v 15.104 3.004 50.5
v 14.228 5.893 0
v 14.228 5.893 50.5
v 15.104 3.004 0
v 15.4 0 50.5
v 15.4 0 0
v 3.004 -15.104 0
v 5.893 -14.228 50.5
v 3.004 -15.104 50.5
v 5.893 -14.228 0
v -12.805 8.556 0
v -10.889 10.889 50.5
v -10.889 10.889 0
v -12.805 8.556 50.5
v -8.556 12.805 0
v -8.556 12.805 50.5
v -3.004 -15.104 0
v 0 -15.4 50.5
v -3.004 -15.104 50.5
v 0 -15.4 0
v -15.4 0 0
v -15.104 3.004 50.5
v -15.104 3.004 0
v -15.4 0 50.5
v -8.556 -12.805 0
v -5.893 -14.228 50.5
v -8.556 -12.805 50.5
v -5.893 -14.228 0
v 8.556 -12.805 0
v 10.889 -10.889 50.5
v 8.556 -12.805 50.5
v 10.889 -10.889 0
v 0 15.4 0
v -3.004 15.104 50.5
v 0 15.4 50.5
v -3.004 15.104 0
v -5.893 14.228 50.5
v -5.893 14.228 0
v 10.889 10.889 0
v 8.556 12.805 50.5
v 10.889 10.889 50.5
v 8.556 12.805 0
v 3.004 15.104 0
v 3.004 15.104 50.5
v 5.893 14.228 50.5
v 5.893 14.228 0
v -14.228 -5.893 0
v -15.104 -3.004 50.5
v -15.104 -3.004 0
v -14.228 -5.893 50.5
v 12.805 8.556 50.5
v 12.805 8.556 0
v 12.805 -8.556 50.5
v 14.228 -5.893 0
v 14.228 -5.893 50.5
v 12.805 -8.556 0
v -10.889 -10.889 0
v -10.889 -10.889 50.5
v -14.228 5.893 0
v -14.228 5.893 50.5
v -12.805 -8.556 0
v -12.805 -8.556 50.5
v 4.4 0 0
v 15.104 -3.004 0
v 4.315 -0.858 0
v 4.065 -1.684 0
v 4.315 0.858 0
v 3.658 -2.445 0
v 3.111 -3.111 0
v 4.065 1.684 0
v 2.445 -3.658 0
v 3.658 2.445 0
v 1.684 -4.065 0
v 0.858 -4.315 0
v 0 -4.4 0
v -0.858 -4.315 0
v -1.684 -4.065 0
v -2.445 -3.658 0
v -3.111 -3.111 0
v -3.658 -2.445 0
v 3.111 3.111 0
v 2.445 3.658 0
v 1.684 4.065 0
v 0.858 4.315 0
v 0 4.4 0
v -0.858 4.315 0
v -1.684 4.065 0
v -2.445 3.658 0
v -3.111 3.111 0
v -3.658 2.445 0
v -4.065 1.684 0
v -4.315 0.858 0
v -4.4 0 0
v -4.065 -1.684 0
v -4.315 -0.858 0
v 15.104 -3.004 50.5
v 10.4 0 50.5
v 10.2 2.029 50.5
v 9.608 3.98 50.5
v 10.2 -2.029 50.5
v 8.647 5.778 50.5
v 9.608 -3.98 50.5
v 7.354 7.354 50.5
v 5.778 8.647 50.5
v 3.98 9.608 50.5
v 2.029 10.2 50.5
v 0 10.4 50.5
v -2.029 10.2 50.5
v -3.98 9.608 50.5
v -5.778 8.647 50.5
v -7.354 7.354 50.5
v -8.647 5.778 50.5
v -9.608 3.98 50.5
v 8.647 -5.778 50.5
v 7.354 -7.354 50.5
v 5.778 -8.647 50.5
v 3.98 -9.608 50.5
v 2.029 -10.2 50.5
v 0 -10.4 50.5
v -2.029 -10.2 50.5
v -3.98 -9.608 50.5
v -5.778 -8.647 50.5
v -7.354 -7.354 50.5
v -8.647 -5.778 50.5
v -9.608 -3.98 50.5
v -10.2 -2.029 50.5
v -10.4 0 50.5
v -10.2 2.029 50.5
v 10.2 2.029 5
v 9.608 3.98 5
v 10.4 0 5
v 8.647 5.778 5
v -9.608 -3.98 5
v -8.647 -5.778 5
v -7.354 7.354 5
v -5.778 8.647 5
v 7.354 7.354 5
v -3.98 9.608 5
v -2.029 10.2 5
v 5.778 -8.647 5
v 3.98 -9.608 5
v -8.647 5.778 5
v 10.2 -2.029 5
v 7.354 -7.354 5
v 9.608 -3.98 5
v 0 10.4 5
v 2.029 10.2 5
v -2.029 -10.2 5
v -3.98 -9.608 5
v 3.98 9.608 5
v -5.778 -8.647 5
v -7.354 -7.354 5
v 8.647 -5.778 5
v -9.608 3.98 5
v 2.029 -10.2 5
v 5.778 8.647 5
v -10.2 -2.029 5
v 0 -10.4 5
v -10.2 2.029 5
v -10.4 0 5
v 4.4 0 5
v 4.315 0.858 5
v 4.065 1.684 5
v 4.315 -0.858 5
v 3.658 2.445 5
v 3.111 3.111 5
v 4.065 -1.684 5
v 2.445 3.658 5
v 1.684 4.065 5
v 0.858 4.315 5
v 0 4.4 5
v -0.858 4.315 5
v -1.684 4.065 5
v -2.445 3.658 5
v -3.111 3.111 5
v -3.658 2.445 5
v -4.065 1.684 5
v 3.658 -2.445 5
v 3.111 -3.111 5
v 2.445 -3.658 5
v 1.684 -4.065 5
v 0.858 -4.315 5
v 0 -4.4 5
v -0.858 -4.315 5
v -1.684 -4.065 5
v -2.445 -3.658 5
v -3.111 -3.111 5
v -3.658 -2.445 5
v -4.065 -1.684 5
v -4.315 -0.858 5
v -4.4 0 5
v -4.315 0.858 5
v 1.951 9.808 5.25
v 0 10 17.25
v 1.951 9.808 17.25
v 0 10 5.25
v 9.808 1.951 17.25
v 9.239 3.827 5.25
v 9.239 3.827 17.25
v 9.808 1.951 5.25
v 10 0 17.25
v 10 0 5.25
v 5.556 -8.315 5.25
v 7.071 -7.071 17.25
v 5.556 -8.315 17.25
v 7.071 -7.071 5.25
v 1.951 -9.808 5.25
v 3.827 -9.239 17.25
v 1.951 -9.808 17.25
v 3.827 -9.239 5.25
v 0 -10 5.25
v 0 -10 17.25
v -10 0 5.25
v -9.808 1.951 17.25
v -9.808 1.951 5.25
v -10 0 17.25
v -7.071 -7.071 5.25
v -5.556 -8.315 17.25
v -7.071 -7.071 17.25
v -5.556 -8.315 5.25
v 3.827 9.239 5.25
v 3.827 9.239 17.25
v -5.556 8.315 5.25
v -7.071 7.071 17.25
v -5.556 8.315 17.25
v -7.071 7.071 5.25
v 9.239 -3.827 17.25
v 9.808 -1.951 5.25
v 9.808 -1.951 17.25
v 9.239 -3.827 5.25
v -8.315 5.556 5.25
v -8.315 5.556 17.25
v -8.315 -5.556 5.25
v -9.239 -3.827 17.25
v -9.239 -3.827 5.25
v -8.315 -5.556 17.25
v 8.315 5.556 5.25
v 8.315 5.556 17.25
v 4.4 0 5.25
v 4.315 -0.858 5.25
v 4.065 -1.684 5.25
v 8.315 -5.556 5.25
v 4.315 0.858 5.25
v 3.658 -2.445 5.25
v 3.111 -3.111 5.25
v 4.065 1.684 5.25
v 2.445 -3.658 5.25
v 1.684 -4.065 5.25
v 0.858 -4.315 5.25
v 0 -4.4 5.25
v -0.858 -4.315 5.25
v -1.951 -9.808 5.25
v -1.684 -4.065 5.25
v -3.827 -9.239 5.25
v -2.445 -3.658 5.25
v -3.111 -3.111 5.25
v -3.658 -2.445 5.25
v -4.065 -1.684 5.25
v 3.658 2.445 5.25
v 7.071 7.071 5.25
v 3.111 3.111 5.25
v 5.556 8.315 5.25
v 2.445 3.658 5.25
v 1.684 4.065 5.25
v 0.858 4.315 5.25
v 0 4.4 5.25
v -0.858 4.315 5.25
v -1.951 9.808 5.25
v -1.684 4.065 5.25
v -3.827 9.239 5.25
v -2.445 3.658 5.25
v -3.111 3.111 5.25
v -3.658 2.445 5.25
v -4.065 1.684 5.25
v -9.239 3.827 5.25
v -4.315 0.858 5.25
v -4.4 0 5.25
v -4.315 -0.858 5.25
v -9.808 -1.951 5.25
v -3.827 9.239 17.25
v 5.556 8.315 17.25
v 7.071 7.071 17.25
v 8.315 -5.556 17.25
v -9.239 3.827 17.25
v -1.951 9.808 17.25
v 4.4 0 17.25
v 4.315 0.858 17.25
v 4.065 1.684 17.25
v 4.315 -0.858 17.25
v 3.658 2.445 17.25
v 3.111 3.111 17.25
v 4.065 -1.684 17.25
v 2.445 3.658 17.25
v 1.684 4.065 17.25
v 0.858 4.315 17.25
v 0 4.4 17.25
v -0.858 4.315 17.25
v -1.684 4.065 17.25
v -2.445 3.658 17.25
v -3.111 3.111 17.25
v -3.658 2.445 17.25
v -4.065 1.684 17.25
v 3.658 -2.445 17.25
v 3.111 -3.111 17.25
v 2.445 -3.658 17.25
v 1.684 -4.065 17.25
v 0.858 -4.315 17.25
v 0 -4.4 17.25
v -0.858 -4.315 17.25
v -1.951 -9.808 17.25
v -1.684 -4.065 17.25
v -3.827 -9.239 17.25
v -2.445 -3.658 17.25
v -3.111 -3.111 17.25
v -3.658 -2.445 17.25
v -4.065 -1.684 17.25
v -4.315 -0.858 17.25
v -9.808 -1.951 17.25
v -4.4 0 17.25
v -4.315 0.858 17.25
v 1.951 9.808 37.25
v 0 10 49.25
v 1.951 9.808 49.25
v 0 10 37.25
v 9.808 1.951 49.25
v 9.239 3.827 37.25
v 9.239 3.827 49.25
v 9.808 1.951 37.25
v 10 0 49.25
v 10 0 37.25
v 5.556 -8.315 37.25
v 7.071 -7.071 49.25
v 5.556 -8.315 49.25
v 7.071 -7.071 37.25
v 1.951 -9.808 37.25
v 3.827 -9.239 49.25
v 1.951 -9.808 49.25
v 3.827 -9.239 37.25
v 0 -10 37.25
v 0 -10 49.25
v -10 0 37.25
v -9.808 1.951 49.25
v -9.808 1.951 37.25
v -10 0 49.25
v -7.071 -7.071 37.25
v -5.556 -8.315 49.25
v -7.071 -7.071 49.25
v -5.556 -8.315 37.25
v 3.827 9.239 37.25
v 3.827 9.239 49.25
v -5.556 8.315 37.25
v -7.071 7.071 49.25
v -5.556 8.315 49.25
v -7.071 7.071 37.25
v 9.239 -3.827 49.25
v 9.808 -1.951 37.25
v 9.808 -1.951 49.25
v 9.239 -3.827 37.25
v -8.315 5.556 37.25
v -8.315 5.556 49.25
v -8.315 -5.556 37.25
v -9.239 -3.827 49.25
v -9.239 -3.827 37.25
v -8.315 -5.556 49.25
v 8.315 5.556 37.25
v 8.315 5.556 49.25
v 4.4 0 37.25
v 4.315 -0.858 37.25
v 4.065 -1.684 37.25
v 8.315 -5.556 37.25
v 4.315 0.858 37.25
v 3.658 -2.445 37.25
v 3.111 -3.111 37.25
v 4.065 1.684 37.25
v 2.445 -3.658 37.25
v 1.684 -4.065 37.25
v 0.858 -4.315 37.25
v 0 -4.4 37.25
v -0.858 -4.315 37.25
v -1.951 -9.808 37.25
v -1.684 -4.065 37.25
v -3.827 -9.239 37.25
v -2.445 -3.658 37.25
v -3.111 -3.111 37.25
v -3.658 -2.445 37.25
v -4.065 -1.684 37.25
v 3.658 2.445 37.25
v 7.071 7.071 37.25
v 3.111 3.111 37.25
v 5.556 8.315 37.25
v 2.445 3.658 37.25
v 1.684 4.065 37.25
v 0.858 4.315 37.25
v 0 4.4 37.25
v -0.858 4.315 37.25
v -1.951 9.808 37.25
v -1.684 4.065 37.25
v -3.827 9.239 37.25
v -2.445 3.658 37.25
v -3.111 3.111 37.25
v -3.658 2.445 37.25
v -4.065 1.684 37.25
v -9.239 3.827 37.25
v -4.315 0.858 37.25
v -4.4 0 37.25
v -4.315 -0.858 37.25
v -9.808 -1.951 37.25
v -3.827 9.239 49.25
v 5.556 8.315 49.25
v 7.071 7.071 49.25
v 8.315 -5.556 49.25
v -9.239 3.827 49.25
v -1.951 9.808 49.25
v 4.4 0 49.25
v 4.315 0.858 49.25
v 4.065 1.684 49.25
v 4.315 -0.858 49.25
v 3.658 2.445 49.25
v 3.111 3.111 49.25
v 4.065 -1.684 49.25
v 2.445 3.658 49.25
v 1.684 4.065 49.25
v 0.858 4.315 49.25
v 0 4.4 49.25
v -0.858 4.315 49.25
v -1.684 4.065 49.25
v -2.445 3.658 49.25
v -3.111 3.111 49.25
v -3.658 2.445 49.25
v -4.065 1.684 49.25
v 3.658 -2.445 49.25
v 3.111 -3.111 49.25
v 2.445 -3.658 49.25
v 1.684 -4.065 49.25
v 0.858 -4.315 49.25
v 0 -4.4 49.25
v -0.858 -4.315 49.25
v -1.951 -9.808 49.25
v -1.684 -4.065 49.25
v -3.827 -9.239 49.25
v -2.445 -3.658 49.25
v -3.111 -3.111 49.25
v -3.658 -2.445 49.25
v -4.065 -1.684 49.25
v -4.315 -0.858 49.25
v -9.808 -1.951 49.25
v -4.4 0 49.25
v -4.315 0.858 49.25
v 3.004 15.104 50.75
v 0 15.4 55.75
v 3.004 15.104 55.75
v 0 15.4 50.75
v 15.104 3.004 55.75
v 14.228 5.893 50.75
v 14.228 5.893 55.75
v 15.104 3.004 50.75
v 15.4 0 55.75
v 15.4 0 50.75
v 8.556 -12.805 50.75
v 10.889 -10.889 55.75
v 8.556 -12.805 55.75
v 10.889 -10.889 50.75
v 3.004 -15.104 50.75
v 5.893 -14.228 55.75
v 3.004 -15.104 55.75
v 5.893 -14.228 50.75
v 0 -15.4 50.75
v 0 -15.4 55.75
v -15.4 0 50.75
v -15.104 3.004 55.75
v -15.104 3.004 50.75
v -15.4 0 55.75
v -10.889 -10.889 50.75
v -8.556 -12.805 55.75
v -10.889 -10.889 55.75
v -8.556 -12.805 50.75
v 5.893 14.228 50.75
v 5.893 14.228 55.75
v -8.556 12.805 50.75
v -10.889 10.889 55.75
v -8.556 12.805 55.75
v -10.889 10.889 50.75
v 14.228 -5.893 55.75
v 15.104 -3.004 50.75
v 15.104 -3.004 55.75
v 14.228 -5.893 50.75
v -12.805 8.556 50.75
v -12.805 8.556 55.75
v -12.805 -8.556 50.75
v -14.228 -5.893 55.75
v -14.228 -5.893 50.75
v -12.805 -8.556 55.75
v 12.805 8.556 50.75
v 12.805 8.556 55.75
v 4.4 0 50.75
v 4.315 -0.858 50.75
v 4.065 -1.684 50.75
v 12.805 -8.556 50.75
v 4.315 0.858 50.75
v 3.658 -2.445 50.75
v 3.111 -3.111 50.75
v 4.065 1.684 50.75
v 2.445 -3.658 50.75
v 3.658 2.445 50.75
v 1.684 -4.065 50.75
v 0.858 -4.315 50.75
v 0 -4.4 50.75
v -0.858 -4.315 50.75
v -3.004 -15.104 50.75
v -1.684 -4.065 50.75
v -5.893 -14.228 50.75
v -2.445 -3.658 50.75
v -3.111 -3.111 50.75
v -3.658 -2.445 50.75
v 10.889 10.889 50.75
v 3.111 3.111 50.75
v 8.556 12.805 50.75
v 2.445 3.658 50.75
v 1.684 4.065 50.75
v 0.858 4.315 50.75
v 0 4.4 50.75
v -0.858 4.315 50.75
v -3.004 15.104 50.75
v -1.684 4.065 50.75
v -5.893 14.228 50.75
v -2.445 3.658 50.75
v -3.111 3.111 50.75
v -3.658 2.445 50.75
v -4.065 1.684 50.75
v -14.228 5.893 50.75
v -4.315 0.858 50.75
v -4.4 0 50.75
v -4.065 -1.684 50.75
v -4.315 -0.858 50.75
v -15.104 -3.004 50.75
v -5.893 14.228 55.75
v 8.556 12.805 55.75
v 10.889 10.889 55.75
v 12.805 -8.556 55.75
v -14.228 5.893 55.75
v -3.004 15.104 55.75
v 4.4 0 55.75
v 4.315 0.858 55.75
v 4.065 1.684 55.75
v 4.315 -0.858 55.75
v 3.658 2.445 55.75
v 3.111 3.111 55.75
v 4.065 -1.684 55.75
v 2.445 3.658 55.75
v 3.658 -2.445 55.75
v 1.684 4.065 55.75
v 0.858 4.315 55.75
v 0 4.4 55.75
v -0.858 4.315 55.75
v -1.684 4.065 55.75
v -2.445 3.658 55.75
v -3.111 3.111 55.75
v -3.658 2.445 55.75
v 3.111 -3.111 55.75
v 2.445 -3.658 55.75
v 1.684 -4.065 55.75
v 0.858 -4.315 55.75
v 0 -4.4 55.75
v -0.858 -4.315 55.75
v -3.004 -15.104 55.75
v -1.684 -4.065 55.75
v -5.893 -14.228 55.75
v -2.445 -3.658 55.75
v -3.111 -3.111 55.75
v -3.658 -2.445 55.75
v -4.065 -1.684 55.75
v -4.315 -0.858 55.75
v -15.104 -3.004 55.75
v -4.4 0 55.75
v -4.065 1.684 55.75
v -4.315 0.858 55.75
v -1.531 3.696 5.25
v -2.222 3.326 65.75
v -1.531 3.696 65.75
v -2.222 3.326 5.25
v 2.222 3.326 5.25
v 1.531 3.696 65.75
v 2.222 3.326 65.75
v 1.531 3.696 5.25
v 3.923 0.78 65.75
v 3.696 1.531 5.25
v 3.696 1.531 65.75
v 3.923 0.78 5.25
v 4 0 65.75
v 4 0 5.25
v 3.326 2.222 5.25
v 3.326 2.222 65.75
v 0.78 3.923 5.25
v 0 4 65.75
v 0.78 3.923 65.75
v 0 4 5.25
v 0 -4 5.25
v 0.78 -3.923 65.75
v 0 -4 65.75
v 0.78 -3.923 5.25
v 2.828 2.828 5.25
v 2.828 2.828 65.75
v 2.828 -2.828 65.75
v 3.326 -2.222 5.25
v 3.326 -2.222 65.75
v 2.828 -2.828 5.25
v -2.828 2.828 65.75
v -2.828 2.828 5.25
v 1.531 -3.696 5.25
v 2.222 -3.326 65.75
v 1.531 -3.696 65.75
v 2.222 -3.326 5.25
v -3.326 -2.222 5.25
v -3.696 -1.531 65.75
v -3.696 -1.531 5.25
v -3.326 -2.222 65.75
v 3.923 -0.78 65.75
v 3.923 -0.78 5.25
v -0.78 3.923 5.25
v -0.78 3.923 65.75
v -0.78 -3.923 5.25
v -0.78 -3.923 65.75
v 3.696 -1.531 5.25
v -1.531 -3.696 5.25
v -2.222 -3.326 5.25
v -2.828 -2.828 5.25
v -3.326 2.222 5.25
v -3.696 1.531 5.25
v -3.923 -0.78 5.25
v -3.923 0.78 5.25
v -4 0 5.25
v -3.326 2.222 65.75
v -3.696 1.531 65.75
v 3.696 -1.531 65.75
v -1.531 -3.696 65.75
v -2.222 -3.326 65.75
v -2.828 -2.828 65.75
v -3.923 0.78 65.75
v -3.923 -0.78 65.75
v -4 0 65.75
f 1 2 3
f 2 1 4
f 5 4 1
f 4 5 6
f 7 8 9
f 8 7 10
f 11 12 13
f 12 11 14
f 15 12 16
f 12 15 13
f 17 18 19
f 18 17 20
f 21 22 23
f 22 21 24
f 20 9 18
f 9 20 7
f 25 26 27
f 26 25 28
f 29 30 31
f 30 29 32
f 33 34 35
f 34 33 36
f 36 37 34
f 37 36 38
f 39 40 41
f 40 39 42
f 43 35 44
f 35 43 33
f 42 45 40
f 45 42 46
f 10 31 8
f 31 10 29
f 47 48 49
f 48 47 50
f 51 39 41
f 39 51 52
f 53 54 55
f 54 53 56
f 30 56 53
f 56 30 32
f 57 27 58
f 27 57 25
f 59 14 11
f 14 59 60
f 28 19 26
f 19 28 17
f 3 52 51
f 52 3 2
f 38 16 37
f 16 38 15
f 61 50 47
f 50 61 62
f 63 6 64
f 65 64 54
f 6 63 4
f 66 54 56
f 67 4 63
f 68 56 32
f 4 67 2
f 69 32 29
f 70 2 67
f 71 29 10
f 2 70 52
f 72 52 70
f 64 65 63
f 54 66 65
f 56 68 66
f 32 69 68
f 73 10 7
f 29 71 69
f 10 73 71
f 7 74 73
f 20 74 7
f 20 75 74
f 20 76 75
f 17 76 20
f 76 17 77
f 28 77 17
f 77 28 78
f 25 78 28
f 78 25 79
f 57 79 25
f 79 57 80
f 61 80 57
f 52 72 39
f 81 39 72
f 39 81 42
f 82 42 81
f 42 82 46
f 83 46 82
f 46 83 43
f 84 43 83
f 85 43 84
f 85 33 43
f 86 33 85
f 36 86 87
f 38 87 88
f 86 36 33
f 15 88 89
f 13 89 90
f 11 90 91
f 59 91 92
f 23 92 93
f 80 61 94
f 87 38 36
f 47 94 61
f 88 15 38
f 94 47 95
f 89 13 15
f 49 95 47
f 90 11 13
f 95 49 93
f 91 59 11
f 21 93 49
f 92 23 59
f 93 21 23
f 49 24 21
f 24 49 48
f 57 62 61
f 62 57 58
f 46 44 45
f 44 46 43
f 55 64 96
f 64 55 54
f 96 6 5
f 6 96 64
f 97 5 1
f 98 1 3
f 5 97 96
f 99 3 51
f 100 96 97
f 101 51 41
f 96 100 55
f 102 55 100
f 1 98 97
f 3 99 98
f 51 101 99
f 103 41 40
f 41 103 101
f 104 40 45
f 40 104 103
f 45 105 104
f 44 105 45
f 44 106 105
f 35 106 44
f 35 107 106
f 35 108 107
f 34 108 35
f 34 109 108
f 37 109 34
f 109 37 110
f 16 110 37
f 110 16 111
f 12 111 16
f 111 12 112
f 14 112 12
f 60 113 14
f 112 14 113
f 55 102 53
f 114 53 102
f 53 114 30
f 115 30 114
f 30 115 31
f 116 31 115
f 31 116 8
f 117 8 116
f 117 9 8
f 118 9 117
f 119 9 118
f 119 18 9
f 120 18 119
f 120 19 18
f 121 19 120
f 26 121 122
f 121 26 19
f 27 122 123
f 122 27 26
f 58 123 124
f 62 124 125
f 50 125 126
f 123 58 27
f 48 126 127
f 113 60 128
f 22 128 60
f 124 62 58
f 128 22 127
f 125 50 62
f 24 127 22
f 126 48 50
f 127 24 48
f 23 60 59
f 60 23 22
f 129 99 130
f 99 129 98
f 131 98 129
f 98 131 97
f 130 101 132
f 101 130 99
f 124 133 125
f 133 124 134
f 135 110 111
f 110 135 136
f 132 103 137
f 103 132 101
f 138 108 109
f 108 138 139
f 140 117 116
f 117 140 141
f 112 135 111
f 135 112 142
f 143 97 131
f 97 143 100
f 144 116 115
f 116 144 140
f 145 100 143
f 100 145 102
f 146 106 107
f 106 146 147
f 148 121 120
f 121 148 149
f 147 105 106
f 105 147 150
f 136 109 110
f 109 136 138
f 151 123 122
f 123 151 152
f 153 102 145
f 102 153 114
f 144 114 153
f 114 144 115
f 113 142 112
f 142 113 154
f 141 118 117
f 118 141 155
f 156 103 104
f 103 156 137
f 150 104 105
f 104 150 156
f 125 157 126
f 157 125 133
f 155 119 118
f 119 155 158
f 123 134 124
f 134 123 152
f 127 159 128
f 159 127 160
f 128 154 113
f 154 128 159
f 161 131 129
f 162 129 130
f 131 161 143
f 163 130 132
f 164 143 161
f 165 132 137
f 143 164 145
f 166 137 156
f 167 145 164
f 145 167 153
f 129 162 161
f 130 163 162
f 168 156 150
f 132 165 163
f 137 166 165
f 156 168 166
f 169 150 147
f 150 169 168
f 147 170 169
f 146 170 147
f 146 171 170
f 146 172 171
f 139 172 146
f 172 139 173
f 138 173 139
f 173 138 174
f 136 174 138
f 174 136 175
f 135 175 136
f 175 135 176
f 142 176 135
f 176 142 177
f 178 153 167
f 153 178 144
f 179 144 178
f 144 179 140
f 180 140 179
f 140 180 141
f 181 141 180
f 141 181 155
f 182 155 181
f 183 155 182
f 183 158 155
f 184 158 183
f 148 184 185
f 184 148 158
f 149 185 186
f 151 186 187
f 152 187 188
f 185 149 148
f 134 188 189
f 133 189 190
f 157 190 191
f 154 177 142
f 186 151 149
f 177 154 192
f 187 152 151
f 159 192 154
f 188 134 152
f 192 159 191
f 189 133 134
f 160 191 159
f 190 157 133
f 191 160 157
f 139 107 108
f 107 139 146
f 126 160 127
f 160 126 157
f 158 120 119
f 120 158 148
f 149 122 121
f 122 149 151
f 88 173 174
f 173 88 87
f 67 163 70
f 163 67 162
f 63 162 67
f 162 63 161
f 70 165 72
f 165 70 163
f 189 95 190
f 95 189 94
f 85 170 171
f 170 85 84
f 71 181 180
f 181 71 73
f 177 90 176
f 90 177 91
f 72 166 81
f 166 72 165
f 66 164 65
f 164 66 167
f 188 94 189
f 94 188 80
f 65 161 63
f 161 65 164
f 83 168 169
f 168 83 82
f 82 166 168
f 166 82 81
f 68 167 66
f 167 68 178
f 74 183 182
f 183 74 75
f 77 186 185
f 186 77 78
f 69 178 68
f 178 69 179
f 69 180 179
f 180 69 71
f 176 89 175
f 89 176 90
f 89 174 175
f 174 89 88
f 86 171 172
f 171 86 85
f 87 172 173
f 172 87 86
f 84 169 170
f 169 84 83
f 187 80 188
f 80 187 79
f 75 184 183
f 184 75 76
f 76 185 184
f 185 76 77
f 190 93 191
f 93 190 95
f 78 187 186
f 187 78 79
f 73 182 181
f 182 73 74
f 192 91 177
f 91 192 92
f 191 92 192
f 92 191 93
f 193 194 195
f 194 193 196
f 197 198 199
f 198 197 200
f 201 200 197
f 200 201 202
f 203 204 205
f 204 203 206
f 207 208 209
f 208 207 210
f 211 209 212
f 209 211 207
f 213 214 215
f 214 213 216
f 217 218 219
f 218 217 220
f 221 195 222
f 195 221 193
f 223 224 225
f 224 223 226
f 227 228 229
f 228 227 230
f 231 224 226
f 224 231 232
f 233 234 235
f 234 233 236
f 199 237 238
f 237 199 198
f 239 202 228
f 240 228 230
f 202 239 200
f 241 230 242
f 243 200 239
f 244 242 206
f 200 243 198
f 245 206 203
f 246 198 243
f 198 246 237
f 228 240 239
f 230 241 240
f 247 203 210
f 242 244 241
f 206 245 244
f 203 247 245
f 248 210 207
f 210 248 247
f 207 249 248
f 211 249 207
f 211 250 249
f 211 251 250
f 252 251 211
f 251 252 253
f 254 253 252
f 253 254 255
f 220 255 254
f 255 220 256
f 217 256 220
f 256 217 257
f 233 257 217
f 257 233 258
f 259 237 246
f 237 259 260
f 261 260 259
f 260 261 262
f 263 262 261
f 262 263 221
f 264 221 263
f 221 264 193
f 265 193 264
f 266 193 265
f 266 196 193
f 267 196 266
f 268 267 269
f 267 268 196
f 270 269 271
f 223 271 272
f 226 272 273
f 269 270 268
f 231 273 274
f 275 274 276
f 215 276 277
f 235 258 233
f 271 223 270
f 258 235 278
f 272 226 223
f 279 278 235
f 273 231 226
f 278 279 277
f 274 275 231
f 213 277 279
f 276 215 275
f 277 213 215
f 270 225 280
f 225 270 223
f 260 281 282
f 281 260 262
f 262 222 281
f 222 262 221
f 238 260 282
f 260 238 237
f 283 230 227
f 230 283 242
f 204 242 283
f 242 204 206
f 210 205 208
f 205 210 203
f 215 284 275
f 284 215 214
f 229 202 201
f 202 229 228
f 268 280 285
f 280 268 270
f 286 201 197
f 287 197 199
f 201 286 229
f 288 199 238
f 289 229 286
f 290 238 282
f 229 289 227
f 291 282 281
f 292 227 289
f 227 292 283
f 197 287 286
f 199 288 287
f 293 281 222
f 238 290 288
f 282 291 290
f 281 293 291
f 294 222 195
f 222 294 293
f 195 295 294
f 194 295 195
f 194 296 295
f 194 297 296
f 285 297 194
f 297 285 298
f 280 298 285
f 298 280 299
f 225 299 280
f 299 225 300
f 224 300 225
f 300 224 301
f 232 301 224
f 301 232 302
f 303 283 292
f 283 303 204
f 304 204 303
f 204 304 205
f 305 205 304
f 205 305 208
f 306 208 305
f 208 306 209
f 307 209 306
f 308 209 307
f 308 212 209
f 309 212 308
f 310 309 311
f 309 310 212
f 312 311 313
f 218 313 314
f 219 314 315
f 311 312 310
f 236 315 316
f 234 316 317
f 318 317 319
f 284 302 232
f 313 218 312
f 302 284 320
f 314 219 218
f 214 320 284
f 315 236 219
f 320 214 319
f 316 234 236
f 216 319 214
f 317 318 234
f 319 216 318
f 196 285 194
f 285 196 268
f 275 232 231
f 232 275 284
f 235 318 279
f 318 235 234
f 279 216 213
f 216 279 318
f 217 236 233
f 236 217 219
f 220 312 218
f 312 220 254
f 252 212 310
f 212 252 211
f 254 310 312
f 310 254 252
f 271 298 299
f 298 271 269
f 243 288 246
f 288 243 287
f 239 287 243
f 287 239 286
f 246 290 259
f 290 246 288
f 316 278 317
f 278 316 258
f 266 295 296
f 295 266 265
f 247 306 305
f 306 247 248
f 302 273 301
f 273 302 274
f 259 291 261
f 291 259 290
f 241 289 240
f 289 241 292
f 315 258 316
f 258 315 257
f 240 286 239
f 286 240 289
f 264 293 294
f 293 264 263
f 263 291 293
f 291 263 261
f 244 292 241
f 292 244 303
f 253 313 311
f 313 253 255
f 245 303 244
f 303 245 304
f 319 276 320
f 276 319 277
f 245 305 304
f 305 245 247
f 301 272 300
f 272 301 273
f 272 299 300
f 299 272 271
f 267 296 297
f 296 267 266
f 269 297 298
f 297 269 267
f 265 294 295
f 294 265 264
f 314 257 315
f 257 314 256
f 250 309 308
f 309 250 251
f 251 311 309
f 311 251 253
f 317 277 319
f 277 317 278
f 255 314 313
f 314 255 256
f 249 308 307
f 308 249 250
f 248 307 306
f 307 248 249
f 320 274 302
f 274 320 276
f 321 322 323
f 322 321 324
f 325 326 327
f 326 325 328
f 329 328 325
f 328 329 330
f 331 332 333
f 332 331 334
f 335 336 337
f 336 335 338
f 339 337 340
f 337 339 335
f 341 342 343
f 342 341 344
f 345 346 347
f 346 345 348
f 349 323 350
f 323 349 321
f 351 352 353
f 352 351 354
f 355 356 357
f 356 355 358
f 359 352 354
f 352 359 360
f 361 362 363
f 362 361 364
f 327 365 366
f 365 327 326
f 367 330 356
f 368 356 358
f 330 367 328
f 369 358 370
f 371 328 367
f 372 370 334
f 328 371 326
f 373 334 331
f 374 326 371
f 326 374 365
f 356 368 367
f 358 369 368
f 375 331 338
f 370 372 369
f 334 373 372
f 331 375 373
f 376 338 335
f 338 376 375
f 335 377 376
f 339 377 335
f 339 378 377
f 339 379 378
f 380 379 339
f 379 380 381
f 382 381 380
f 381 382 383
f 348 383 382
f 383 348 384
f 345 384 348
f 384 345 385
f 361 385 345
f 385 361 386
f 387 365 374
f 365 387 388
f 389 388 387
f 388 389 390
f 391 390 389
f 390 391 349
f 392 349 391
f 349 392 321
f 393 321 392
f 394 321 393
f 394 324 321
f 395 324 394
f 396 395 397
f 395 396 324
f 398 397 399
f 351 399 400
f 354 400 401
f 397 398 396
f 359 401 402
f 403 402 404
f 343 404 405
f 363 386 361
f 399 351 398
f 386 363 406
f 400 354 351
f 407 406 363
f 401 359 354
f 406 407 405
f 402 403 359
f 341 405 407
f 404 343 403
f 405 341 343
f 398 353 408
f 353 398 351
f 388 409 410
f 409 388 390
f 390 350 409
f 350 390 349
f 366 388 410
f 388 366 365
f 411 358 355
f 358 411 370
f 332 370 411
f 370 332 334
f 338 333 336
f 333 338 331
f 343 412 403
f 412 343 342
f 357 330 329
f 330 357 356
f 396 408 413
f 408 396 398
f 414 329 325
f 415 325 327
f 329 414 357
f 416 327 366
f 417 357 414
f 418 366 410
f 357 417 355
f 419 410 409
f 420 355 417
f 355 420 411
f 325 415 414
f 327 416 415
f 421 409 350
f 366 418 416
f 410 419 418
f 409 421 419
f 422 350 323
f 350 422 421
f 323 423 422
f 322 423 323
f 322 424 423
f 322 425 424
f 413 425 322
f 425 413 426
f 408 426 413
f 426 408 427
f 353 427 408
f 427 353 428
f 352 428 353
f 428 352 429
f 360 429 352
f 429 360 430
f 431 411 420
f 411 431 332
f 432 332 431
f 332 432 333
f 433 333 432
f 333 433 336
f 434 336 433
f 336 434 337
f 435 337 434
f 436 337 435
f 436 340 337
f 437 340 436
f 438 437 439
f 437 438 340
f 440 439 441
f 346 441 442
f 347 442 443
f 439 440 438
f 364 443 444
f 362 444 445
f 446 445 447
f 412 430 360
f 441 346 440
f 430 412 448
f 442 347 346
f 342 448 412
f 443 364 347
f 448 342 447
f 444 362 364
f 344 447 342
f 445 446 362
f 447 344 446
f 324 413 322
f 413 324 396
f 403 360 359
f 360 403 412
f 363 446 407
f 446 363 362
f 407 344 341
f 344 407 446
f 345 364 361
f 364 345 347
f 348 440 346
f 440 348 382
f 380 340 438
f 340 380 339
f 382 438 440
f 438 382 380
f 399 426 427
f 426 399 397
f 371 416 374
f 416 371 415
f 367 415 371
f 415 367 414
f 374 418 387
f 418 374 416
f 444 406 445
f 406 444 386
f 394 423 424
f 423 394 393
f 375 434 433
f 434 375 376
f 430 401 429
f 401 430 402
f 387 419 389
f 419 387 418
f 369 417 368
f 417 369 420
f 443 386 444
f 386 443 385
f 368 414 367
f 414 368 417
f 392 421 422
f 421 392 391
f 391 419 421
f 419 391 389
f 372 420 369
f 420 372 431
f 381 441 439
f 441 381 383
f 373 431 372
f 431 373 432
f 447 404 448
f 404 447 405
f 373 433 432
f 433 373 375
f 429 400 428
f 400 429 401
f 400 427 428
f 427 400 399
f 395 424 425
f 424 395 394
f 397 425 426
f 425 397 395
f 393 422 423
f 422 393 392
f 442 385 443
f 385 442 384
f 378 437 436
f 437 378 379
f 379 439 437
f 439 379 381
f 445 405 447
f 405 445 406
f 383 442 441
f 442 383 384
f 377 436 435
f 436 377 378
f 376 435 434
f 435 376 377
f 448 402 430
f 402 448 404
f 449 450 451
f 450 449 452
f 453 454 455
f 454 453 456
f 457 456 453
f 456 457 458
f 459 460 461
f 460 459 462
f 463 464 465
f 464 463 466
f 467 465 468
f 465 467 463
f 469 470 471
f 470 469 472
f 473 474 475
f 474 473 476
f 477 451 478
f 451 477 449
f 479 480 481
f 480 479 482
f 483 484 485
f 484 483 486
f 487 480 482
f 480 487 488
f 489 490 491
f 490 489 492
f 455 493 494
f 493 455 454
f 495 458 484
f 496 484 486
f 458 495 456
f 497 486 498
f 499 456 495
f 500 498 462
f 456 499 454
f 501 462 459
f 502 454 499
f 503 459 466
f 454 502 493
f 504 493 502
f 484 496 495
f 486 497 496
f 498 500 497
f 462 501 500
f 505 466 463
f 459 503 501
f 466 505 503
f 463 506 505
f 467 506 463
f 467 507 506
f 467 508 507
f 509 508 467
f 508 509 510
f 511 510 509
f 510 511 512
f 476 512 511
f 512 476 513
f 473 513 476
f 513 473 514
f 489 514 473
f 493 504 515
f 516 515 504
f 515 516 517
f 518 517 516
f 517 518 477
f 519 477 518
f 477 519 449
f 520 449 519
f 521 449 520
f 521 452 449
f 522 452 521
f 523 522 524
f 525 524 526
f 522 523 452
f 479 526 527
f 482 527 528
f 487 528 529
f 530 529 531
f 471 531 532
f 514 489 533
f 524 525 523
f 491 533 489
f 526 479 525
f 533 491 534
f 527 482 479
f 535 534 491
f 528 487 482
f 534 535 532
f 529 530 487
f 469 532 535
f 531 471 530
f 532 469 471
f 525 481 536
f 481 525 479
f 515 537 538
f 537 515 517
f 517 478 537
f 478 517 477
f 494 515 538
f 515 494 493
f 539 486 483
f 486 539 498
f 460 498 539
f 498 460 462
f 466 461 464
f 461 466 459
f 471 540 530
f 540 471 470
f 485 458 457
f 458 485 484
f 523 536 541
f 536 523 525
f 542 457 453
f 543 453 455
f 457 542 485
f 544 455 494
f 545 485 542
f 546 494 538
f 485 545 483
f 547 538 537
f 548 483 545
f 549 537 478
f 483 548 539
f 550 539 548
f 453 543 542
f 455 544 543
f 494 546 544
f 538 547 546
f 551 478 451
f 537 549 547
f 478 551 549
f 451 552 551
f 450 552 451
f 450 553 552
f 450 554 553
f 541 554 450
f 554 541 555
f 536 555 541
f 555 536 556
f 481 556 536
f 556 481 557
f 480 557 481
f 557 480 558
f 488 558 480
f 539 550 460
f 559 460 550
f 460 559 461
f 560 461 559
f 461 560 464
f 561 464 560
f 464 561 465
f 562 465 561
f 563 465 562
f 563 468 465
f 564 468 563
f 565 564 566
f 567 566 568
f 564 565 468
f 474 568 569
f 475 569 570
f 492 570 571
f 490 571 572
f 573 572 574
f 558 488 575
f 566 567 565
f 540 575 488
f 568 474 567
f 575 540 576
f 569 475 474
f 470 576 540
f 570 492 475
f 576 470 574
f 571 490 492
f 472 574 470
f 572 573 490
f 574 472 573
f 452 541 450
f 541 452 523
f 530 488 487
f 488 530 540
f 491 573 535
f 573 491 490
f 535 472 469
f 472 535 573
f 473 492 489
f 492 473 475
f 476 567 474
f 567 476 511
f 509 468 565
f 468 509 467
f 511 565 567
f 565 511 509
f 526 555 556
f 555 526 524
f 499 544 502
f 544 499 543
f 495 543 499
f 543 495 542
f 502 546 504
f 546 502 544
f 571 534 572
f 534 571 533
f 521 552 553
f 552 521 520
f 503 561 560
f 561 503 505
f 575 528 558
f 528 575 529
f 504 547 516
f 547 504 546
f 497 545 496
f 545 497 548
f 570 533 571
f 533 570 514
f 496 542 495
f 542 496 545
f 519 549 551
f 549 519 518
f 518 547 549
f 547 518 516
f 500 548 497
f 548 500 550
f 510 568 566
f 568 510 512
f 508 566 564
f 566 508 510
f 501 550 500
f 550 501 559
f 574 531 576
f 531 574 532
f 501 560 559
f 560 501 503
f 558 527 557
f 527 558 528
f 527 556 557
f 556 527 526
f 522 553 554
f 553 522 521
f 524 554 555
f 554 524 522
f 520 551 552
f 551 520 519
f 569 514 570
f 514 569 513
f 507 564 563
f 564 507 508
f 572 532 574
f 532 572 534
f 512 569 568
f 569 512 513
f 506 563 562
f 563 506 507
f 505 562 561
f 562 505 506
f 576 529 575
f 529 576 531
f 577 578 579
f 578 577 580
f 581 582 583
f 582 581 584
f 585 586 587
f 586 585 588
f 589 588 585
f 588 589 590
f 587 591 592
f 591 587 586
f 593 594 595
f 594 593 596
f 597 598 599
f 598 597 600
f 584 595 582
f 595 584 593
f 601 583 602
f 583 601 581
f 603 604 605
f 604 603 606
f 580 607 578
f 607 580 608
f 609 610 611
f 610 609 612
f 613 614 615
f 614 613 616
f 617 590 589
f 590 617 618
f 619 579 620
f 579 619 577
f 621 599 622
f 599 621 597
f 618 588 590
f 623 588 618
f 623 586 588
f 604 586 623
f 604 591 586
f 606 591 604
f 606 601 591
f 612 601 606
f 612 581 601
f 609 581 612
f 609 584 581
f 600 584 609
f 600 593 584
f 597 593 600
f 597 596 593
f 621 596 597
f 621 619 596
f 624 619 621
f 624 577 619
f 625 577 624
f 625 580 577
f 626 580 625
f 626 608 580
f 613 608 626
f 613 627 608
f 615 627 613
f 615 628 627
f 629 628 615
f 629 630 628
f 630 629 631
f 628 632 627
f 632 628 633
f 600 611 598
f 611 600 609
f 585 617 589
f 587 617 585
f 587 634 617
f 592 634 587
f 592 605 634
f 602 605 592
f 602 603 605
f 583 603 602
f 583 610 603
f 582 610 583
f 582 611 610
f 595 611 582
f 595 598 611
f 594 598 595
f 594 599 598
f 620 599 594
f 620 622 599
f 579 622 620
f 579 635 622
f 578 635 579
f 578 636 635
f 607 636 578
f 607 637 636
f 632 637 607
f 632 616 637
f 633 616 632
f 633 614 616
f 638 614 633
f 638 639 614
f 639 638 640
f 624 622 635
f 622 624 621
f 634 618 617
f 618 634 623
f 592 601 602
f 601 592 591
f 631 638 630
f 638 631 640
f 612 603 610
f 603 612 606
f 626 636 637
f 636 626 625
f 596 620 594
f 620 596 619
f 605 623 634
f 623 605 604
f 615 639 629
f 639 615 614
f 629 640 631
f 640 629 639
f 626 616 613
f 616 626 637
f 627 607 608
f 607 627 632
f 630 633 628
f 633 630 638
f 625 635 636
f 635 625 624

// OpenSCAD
$fn = 32;

// ------------------------------------------------------------------------
// Shaft station: cup d30.8 x 50.5 mm, shaft d8
// Every part is its own module, assembly() places every instance.
// ------------------------------------------------------------------------

// --- part 1 ---
module housing_cup() {
  difference() {
    cylinder(h = 50.5, d = 30.8);
    translate([0, 0, 5]) cylinder(h = 46.5, d = 20.8);
    translate([0, 0, -1]) cylinder(h = 7, d = 8.8);
  }
}

// --- part 2 ---
module bearing_lower() {
  difference() {
      translate([0, 0, 0]) cylinder(h = 12, d = 20);
      translate([0, 0, -1]) cylinder(h = 14, d = 8.8);
    }
}

// --- part 3 ---
module bearing_upper() {
  difference() {
      translate([0, 0, 0]) cylinder(h = 12, d = 20);
      translate([0, 0, -1]) cylinder(h = 14, d = 8.8);
    }
}

// --- part 4 ---
module station_shaft() {
  translate([0, 0, -30.25]) cylinder(h = 60.5, d = 8);
}

// --- part 5 ---
module station_cover() {
  difference() {
    cylinder(h = 5, d = 30.8);
    translate([0, 0, -1]) cylinder(h = 7, d = 8.8);
  }
}

// --- assembly ---
module assembly() {
  color([0.80, 0.24, 0.20]) translate([0, 0, 0]) rotate([0, 0, 0]) housing_cup();
  color([0.20, 0.45, 0.75]) translate([0, 0, 5.25]) rotate([0, 0, 0]) bearing_lower();
  color([0.25, 0.62, 0.32]) translate([0, 0, 37.25]) rotate([0, 0, 0]) bearing_upper();
  color([0.92, 0.70, 0.18]) translate([0, 0, 35.5]) rotate([0, 0, 0]) station_shaft();
  color([0.58, 0.35, 0.70]) translate([0, 0, 50.75]) rotate([0, 0, 0]) station_cover();
}

assembly();
